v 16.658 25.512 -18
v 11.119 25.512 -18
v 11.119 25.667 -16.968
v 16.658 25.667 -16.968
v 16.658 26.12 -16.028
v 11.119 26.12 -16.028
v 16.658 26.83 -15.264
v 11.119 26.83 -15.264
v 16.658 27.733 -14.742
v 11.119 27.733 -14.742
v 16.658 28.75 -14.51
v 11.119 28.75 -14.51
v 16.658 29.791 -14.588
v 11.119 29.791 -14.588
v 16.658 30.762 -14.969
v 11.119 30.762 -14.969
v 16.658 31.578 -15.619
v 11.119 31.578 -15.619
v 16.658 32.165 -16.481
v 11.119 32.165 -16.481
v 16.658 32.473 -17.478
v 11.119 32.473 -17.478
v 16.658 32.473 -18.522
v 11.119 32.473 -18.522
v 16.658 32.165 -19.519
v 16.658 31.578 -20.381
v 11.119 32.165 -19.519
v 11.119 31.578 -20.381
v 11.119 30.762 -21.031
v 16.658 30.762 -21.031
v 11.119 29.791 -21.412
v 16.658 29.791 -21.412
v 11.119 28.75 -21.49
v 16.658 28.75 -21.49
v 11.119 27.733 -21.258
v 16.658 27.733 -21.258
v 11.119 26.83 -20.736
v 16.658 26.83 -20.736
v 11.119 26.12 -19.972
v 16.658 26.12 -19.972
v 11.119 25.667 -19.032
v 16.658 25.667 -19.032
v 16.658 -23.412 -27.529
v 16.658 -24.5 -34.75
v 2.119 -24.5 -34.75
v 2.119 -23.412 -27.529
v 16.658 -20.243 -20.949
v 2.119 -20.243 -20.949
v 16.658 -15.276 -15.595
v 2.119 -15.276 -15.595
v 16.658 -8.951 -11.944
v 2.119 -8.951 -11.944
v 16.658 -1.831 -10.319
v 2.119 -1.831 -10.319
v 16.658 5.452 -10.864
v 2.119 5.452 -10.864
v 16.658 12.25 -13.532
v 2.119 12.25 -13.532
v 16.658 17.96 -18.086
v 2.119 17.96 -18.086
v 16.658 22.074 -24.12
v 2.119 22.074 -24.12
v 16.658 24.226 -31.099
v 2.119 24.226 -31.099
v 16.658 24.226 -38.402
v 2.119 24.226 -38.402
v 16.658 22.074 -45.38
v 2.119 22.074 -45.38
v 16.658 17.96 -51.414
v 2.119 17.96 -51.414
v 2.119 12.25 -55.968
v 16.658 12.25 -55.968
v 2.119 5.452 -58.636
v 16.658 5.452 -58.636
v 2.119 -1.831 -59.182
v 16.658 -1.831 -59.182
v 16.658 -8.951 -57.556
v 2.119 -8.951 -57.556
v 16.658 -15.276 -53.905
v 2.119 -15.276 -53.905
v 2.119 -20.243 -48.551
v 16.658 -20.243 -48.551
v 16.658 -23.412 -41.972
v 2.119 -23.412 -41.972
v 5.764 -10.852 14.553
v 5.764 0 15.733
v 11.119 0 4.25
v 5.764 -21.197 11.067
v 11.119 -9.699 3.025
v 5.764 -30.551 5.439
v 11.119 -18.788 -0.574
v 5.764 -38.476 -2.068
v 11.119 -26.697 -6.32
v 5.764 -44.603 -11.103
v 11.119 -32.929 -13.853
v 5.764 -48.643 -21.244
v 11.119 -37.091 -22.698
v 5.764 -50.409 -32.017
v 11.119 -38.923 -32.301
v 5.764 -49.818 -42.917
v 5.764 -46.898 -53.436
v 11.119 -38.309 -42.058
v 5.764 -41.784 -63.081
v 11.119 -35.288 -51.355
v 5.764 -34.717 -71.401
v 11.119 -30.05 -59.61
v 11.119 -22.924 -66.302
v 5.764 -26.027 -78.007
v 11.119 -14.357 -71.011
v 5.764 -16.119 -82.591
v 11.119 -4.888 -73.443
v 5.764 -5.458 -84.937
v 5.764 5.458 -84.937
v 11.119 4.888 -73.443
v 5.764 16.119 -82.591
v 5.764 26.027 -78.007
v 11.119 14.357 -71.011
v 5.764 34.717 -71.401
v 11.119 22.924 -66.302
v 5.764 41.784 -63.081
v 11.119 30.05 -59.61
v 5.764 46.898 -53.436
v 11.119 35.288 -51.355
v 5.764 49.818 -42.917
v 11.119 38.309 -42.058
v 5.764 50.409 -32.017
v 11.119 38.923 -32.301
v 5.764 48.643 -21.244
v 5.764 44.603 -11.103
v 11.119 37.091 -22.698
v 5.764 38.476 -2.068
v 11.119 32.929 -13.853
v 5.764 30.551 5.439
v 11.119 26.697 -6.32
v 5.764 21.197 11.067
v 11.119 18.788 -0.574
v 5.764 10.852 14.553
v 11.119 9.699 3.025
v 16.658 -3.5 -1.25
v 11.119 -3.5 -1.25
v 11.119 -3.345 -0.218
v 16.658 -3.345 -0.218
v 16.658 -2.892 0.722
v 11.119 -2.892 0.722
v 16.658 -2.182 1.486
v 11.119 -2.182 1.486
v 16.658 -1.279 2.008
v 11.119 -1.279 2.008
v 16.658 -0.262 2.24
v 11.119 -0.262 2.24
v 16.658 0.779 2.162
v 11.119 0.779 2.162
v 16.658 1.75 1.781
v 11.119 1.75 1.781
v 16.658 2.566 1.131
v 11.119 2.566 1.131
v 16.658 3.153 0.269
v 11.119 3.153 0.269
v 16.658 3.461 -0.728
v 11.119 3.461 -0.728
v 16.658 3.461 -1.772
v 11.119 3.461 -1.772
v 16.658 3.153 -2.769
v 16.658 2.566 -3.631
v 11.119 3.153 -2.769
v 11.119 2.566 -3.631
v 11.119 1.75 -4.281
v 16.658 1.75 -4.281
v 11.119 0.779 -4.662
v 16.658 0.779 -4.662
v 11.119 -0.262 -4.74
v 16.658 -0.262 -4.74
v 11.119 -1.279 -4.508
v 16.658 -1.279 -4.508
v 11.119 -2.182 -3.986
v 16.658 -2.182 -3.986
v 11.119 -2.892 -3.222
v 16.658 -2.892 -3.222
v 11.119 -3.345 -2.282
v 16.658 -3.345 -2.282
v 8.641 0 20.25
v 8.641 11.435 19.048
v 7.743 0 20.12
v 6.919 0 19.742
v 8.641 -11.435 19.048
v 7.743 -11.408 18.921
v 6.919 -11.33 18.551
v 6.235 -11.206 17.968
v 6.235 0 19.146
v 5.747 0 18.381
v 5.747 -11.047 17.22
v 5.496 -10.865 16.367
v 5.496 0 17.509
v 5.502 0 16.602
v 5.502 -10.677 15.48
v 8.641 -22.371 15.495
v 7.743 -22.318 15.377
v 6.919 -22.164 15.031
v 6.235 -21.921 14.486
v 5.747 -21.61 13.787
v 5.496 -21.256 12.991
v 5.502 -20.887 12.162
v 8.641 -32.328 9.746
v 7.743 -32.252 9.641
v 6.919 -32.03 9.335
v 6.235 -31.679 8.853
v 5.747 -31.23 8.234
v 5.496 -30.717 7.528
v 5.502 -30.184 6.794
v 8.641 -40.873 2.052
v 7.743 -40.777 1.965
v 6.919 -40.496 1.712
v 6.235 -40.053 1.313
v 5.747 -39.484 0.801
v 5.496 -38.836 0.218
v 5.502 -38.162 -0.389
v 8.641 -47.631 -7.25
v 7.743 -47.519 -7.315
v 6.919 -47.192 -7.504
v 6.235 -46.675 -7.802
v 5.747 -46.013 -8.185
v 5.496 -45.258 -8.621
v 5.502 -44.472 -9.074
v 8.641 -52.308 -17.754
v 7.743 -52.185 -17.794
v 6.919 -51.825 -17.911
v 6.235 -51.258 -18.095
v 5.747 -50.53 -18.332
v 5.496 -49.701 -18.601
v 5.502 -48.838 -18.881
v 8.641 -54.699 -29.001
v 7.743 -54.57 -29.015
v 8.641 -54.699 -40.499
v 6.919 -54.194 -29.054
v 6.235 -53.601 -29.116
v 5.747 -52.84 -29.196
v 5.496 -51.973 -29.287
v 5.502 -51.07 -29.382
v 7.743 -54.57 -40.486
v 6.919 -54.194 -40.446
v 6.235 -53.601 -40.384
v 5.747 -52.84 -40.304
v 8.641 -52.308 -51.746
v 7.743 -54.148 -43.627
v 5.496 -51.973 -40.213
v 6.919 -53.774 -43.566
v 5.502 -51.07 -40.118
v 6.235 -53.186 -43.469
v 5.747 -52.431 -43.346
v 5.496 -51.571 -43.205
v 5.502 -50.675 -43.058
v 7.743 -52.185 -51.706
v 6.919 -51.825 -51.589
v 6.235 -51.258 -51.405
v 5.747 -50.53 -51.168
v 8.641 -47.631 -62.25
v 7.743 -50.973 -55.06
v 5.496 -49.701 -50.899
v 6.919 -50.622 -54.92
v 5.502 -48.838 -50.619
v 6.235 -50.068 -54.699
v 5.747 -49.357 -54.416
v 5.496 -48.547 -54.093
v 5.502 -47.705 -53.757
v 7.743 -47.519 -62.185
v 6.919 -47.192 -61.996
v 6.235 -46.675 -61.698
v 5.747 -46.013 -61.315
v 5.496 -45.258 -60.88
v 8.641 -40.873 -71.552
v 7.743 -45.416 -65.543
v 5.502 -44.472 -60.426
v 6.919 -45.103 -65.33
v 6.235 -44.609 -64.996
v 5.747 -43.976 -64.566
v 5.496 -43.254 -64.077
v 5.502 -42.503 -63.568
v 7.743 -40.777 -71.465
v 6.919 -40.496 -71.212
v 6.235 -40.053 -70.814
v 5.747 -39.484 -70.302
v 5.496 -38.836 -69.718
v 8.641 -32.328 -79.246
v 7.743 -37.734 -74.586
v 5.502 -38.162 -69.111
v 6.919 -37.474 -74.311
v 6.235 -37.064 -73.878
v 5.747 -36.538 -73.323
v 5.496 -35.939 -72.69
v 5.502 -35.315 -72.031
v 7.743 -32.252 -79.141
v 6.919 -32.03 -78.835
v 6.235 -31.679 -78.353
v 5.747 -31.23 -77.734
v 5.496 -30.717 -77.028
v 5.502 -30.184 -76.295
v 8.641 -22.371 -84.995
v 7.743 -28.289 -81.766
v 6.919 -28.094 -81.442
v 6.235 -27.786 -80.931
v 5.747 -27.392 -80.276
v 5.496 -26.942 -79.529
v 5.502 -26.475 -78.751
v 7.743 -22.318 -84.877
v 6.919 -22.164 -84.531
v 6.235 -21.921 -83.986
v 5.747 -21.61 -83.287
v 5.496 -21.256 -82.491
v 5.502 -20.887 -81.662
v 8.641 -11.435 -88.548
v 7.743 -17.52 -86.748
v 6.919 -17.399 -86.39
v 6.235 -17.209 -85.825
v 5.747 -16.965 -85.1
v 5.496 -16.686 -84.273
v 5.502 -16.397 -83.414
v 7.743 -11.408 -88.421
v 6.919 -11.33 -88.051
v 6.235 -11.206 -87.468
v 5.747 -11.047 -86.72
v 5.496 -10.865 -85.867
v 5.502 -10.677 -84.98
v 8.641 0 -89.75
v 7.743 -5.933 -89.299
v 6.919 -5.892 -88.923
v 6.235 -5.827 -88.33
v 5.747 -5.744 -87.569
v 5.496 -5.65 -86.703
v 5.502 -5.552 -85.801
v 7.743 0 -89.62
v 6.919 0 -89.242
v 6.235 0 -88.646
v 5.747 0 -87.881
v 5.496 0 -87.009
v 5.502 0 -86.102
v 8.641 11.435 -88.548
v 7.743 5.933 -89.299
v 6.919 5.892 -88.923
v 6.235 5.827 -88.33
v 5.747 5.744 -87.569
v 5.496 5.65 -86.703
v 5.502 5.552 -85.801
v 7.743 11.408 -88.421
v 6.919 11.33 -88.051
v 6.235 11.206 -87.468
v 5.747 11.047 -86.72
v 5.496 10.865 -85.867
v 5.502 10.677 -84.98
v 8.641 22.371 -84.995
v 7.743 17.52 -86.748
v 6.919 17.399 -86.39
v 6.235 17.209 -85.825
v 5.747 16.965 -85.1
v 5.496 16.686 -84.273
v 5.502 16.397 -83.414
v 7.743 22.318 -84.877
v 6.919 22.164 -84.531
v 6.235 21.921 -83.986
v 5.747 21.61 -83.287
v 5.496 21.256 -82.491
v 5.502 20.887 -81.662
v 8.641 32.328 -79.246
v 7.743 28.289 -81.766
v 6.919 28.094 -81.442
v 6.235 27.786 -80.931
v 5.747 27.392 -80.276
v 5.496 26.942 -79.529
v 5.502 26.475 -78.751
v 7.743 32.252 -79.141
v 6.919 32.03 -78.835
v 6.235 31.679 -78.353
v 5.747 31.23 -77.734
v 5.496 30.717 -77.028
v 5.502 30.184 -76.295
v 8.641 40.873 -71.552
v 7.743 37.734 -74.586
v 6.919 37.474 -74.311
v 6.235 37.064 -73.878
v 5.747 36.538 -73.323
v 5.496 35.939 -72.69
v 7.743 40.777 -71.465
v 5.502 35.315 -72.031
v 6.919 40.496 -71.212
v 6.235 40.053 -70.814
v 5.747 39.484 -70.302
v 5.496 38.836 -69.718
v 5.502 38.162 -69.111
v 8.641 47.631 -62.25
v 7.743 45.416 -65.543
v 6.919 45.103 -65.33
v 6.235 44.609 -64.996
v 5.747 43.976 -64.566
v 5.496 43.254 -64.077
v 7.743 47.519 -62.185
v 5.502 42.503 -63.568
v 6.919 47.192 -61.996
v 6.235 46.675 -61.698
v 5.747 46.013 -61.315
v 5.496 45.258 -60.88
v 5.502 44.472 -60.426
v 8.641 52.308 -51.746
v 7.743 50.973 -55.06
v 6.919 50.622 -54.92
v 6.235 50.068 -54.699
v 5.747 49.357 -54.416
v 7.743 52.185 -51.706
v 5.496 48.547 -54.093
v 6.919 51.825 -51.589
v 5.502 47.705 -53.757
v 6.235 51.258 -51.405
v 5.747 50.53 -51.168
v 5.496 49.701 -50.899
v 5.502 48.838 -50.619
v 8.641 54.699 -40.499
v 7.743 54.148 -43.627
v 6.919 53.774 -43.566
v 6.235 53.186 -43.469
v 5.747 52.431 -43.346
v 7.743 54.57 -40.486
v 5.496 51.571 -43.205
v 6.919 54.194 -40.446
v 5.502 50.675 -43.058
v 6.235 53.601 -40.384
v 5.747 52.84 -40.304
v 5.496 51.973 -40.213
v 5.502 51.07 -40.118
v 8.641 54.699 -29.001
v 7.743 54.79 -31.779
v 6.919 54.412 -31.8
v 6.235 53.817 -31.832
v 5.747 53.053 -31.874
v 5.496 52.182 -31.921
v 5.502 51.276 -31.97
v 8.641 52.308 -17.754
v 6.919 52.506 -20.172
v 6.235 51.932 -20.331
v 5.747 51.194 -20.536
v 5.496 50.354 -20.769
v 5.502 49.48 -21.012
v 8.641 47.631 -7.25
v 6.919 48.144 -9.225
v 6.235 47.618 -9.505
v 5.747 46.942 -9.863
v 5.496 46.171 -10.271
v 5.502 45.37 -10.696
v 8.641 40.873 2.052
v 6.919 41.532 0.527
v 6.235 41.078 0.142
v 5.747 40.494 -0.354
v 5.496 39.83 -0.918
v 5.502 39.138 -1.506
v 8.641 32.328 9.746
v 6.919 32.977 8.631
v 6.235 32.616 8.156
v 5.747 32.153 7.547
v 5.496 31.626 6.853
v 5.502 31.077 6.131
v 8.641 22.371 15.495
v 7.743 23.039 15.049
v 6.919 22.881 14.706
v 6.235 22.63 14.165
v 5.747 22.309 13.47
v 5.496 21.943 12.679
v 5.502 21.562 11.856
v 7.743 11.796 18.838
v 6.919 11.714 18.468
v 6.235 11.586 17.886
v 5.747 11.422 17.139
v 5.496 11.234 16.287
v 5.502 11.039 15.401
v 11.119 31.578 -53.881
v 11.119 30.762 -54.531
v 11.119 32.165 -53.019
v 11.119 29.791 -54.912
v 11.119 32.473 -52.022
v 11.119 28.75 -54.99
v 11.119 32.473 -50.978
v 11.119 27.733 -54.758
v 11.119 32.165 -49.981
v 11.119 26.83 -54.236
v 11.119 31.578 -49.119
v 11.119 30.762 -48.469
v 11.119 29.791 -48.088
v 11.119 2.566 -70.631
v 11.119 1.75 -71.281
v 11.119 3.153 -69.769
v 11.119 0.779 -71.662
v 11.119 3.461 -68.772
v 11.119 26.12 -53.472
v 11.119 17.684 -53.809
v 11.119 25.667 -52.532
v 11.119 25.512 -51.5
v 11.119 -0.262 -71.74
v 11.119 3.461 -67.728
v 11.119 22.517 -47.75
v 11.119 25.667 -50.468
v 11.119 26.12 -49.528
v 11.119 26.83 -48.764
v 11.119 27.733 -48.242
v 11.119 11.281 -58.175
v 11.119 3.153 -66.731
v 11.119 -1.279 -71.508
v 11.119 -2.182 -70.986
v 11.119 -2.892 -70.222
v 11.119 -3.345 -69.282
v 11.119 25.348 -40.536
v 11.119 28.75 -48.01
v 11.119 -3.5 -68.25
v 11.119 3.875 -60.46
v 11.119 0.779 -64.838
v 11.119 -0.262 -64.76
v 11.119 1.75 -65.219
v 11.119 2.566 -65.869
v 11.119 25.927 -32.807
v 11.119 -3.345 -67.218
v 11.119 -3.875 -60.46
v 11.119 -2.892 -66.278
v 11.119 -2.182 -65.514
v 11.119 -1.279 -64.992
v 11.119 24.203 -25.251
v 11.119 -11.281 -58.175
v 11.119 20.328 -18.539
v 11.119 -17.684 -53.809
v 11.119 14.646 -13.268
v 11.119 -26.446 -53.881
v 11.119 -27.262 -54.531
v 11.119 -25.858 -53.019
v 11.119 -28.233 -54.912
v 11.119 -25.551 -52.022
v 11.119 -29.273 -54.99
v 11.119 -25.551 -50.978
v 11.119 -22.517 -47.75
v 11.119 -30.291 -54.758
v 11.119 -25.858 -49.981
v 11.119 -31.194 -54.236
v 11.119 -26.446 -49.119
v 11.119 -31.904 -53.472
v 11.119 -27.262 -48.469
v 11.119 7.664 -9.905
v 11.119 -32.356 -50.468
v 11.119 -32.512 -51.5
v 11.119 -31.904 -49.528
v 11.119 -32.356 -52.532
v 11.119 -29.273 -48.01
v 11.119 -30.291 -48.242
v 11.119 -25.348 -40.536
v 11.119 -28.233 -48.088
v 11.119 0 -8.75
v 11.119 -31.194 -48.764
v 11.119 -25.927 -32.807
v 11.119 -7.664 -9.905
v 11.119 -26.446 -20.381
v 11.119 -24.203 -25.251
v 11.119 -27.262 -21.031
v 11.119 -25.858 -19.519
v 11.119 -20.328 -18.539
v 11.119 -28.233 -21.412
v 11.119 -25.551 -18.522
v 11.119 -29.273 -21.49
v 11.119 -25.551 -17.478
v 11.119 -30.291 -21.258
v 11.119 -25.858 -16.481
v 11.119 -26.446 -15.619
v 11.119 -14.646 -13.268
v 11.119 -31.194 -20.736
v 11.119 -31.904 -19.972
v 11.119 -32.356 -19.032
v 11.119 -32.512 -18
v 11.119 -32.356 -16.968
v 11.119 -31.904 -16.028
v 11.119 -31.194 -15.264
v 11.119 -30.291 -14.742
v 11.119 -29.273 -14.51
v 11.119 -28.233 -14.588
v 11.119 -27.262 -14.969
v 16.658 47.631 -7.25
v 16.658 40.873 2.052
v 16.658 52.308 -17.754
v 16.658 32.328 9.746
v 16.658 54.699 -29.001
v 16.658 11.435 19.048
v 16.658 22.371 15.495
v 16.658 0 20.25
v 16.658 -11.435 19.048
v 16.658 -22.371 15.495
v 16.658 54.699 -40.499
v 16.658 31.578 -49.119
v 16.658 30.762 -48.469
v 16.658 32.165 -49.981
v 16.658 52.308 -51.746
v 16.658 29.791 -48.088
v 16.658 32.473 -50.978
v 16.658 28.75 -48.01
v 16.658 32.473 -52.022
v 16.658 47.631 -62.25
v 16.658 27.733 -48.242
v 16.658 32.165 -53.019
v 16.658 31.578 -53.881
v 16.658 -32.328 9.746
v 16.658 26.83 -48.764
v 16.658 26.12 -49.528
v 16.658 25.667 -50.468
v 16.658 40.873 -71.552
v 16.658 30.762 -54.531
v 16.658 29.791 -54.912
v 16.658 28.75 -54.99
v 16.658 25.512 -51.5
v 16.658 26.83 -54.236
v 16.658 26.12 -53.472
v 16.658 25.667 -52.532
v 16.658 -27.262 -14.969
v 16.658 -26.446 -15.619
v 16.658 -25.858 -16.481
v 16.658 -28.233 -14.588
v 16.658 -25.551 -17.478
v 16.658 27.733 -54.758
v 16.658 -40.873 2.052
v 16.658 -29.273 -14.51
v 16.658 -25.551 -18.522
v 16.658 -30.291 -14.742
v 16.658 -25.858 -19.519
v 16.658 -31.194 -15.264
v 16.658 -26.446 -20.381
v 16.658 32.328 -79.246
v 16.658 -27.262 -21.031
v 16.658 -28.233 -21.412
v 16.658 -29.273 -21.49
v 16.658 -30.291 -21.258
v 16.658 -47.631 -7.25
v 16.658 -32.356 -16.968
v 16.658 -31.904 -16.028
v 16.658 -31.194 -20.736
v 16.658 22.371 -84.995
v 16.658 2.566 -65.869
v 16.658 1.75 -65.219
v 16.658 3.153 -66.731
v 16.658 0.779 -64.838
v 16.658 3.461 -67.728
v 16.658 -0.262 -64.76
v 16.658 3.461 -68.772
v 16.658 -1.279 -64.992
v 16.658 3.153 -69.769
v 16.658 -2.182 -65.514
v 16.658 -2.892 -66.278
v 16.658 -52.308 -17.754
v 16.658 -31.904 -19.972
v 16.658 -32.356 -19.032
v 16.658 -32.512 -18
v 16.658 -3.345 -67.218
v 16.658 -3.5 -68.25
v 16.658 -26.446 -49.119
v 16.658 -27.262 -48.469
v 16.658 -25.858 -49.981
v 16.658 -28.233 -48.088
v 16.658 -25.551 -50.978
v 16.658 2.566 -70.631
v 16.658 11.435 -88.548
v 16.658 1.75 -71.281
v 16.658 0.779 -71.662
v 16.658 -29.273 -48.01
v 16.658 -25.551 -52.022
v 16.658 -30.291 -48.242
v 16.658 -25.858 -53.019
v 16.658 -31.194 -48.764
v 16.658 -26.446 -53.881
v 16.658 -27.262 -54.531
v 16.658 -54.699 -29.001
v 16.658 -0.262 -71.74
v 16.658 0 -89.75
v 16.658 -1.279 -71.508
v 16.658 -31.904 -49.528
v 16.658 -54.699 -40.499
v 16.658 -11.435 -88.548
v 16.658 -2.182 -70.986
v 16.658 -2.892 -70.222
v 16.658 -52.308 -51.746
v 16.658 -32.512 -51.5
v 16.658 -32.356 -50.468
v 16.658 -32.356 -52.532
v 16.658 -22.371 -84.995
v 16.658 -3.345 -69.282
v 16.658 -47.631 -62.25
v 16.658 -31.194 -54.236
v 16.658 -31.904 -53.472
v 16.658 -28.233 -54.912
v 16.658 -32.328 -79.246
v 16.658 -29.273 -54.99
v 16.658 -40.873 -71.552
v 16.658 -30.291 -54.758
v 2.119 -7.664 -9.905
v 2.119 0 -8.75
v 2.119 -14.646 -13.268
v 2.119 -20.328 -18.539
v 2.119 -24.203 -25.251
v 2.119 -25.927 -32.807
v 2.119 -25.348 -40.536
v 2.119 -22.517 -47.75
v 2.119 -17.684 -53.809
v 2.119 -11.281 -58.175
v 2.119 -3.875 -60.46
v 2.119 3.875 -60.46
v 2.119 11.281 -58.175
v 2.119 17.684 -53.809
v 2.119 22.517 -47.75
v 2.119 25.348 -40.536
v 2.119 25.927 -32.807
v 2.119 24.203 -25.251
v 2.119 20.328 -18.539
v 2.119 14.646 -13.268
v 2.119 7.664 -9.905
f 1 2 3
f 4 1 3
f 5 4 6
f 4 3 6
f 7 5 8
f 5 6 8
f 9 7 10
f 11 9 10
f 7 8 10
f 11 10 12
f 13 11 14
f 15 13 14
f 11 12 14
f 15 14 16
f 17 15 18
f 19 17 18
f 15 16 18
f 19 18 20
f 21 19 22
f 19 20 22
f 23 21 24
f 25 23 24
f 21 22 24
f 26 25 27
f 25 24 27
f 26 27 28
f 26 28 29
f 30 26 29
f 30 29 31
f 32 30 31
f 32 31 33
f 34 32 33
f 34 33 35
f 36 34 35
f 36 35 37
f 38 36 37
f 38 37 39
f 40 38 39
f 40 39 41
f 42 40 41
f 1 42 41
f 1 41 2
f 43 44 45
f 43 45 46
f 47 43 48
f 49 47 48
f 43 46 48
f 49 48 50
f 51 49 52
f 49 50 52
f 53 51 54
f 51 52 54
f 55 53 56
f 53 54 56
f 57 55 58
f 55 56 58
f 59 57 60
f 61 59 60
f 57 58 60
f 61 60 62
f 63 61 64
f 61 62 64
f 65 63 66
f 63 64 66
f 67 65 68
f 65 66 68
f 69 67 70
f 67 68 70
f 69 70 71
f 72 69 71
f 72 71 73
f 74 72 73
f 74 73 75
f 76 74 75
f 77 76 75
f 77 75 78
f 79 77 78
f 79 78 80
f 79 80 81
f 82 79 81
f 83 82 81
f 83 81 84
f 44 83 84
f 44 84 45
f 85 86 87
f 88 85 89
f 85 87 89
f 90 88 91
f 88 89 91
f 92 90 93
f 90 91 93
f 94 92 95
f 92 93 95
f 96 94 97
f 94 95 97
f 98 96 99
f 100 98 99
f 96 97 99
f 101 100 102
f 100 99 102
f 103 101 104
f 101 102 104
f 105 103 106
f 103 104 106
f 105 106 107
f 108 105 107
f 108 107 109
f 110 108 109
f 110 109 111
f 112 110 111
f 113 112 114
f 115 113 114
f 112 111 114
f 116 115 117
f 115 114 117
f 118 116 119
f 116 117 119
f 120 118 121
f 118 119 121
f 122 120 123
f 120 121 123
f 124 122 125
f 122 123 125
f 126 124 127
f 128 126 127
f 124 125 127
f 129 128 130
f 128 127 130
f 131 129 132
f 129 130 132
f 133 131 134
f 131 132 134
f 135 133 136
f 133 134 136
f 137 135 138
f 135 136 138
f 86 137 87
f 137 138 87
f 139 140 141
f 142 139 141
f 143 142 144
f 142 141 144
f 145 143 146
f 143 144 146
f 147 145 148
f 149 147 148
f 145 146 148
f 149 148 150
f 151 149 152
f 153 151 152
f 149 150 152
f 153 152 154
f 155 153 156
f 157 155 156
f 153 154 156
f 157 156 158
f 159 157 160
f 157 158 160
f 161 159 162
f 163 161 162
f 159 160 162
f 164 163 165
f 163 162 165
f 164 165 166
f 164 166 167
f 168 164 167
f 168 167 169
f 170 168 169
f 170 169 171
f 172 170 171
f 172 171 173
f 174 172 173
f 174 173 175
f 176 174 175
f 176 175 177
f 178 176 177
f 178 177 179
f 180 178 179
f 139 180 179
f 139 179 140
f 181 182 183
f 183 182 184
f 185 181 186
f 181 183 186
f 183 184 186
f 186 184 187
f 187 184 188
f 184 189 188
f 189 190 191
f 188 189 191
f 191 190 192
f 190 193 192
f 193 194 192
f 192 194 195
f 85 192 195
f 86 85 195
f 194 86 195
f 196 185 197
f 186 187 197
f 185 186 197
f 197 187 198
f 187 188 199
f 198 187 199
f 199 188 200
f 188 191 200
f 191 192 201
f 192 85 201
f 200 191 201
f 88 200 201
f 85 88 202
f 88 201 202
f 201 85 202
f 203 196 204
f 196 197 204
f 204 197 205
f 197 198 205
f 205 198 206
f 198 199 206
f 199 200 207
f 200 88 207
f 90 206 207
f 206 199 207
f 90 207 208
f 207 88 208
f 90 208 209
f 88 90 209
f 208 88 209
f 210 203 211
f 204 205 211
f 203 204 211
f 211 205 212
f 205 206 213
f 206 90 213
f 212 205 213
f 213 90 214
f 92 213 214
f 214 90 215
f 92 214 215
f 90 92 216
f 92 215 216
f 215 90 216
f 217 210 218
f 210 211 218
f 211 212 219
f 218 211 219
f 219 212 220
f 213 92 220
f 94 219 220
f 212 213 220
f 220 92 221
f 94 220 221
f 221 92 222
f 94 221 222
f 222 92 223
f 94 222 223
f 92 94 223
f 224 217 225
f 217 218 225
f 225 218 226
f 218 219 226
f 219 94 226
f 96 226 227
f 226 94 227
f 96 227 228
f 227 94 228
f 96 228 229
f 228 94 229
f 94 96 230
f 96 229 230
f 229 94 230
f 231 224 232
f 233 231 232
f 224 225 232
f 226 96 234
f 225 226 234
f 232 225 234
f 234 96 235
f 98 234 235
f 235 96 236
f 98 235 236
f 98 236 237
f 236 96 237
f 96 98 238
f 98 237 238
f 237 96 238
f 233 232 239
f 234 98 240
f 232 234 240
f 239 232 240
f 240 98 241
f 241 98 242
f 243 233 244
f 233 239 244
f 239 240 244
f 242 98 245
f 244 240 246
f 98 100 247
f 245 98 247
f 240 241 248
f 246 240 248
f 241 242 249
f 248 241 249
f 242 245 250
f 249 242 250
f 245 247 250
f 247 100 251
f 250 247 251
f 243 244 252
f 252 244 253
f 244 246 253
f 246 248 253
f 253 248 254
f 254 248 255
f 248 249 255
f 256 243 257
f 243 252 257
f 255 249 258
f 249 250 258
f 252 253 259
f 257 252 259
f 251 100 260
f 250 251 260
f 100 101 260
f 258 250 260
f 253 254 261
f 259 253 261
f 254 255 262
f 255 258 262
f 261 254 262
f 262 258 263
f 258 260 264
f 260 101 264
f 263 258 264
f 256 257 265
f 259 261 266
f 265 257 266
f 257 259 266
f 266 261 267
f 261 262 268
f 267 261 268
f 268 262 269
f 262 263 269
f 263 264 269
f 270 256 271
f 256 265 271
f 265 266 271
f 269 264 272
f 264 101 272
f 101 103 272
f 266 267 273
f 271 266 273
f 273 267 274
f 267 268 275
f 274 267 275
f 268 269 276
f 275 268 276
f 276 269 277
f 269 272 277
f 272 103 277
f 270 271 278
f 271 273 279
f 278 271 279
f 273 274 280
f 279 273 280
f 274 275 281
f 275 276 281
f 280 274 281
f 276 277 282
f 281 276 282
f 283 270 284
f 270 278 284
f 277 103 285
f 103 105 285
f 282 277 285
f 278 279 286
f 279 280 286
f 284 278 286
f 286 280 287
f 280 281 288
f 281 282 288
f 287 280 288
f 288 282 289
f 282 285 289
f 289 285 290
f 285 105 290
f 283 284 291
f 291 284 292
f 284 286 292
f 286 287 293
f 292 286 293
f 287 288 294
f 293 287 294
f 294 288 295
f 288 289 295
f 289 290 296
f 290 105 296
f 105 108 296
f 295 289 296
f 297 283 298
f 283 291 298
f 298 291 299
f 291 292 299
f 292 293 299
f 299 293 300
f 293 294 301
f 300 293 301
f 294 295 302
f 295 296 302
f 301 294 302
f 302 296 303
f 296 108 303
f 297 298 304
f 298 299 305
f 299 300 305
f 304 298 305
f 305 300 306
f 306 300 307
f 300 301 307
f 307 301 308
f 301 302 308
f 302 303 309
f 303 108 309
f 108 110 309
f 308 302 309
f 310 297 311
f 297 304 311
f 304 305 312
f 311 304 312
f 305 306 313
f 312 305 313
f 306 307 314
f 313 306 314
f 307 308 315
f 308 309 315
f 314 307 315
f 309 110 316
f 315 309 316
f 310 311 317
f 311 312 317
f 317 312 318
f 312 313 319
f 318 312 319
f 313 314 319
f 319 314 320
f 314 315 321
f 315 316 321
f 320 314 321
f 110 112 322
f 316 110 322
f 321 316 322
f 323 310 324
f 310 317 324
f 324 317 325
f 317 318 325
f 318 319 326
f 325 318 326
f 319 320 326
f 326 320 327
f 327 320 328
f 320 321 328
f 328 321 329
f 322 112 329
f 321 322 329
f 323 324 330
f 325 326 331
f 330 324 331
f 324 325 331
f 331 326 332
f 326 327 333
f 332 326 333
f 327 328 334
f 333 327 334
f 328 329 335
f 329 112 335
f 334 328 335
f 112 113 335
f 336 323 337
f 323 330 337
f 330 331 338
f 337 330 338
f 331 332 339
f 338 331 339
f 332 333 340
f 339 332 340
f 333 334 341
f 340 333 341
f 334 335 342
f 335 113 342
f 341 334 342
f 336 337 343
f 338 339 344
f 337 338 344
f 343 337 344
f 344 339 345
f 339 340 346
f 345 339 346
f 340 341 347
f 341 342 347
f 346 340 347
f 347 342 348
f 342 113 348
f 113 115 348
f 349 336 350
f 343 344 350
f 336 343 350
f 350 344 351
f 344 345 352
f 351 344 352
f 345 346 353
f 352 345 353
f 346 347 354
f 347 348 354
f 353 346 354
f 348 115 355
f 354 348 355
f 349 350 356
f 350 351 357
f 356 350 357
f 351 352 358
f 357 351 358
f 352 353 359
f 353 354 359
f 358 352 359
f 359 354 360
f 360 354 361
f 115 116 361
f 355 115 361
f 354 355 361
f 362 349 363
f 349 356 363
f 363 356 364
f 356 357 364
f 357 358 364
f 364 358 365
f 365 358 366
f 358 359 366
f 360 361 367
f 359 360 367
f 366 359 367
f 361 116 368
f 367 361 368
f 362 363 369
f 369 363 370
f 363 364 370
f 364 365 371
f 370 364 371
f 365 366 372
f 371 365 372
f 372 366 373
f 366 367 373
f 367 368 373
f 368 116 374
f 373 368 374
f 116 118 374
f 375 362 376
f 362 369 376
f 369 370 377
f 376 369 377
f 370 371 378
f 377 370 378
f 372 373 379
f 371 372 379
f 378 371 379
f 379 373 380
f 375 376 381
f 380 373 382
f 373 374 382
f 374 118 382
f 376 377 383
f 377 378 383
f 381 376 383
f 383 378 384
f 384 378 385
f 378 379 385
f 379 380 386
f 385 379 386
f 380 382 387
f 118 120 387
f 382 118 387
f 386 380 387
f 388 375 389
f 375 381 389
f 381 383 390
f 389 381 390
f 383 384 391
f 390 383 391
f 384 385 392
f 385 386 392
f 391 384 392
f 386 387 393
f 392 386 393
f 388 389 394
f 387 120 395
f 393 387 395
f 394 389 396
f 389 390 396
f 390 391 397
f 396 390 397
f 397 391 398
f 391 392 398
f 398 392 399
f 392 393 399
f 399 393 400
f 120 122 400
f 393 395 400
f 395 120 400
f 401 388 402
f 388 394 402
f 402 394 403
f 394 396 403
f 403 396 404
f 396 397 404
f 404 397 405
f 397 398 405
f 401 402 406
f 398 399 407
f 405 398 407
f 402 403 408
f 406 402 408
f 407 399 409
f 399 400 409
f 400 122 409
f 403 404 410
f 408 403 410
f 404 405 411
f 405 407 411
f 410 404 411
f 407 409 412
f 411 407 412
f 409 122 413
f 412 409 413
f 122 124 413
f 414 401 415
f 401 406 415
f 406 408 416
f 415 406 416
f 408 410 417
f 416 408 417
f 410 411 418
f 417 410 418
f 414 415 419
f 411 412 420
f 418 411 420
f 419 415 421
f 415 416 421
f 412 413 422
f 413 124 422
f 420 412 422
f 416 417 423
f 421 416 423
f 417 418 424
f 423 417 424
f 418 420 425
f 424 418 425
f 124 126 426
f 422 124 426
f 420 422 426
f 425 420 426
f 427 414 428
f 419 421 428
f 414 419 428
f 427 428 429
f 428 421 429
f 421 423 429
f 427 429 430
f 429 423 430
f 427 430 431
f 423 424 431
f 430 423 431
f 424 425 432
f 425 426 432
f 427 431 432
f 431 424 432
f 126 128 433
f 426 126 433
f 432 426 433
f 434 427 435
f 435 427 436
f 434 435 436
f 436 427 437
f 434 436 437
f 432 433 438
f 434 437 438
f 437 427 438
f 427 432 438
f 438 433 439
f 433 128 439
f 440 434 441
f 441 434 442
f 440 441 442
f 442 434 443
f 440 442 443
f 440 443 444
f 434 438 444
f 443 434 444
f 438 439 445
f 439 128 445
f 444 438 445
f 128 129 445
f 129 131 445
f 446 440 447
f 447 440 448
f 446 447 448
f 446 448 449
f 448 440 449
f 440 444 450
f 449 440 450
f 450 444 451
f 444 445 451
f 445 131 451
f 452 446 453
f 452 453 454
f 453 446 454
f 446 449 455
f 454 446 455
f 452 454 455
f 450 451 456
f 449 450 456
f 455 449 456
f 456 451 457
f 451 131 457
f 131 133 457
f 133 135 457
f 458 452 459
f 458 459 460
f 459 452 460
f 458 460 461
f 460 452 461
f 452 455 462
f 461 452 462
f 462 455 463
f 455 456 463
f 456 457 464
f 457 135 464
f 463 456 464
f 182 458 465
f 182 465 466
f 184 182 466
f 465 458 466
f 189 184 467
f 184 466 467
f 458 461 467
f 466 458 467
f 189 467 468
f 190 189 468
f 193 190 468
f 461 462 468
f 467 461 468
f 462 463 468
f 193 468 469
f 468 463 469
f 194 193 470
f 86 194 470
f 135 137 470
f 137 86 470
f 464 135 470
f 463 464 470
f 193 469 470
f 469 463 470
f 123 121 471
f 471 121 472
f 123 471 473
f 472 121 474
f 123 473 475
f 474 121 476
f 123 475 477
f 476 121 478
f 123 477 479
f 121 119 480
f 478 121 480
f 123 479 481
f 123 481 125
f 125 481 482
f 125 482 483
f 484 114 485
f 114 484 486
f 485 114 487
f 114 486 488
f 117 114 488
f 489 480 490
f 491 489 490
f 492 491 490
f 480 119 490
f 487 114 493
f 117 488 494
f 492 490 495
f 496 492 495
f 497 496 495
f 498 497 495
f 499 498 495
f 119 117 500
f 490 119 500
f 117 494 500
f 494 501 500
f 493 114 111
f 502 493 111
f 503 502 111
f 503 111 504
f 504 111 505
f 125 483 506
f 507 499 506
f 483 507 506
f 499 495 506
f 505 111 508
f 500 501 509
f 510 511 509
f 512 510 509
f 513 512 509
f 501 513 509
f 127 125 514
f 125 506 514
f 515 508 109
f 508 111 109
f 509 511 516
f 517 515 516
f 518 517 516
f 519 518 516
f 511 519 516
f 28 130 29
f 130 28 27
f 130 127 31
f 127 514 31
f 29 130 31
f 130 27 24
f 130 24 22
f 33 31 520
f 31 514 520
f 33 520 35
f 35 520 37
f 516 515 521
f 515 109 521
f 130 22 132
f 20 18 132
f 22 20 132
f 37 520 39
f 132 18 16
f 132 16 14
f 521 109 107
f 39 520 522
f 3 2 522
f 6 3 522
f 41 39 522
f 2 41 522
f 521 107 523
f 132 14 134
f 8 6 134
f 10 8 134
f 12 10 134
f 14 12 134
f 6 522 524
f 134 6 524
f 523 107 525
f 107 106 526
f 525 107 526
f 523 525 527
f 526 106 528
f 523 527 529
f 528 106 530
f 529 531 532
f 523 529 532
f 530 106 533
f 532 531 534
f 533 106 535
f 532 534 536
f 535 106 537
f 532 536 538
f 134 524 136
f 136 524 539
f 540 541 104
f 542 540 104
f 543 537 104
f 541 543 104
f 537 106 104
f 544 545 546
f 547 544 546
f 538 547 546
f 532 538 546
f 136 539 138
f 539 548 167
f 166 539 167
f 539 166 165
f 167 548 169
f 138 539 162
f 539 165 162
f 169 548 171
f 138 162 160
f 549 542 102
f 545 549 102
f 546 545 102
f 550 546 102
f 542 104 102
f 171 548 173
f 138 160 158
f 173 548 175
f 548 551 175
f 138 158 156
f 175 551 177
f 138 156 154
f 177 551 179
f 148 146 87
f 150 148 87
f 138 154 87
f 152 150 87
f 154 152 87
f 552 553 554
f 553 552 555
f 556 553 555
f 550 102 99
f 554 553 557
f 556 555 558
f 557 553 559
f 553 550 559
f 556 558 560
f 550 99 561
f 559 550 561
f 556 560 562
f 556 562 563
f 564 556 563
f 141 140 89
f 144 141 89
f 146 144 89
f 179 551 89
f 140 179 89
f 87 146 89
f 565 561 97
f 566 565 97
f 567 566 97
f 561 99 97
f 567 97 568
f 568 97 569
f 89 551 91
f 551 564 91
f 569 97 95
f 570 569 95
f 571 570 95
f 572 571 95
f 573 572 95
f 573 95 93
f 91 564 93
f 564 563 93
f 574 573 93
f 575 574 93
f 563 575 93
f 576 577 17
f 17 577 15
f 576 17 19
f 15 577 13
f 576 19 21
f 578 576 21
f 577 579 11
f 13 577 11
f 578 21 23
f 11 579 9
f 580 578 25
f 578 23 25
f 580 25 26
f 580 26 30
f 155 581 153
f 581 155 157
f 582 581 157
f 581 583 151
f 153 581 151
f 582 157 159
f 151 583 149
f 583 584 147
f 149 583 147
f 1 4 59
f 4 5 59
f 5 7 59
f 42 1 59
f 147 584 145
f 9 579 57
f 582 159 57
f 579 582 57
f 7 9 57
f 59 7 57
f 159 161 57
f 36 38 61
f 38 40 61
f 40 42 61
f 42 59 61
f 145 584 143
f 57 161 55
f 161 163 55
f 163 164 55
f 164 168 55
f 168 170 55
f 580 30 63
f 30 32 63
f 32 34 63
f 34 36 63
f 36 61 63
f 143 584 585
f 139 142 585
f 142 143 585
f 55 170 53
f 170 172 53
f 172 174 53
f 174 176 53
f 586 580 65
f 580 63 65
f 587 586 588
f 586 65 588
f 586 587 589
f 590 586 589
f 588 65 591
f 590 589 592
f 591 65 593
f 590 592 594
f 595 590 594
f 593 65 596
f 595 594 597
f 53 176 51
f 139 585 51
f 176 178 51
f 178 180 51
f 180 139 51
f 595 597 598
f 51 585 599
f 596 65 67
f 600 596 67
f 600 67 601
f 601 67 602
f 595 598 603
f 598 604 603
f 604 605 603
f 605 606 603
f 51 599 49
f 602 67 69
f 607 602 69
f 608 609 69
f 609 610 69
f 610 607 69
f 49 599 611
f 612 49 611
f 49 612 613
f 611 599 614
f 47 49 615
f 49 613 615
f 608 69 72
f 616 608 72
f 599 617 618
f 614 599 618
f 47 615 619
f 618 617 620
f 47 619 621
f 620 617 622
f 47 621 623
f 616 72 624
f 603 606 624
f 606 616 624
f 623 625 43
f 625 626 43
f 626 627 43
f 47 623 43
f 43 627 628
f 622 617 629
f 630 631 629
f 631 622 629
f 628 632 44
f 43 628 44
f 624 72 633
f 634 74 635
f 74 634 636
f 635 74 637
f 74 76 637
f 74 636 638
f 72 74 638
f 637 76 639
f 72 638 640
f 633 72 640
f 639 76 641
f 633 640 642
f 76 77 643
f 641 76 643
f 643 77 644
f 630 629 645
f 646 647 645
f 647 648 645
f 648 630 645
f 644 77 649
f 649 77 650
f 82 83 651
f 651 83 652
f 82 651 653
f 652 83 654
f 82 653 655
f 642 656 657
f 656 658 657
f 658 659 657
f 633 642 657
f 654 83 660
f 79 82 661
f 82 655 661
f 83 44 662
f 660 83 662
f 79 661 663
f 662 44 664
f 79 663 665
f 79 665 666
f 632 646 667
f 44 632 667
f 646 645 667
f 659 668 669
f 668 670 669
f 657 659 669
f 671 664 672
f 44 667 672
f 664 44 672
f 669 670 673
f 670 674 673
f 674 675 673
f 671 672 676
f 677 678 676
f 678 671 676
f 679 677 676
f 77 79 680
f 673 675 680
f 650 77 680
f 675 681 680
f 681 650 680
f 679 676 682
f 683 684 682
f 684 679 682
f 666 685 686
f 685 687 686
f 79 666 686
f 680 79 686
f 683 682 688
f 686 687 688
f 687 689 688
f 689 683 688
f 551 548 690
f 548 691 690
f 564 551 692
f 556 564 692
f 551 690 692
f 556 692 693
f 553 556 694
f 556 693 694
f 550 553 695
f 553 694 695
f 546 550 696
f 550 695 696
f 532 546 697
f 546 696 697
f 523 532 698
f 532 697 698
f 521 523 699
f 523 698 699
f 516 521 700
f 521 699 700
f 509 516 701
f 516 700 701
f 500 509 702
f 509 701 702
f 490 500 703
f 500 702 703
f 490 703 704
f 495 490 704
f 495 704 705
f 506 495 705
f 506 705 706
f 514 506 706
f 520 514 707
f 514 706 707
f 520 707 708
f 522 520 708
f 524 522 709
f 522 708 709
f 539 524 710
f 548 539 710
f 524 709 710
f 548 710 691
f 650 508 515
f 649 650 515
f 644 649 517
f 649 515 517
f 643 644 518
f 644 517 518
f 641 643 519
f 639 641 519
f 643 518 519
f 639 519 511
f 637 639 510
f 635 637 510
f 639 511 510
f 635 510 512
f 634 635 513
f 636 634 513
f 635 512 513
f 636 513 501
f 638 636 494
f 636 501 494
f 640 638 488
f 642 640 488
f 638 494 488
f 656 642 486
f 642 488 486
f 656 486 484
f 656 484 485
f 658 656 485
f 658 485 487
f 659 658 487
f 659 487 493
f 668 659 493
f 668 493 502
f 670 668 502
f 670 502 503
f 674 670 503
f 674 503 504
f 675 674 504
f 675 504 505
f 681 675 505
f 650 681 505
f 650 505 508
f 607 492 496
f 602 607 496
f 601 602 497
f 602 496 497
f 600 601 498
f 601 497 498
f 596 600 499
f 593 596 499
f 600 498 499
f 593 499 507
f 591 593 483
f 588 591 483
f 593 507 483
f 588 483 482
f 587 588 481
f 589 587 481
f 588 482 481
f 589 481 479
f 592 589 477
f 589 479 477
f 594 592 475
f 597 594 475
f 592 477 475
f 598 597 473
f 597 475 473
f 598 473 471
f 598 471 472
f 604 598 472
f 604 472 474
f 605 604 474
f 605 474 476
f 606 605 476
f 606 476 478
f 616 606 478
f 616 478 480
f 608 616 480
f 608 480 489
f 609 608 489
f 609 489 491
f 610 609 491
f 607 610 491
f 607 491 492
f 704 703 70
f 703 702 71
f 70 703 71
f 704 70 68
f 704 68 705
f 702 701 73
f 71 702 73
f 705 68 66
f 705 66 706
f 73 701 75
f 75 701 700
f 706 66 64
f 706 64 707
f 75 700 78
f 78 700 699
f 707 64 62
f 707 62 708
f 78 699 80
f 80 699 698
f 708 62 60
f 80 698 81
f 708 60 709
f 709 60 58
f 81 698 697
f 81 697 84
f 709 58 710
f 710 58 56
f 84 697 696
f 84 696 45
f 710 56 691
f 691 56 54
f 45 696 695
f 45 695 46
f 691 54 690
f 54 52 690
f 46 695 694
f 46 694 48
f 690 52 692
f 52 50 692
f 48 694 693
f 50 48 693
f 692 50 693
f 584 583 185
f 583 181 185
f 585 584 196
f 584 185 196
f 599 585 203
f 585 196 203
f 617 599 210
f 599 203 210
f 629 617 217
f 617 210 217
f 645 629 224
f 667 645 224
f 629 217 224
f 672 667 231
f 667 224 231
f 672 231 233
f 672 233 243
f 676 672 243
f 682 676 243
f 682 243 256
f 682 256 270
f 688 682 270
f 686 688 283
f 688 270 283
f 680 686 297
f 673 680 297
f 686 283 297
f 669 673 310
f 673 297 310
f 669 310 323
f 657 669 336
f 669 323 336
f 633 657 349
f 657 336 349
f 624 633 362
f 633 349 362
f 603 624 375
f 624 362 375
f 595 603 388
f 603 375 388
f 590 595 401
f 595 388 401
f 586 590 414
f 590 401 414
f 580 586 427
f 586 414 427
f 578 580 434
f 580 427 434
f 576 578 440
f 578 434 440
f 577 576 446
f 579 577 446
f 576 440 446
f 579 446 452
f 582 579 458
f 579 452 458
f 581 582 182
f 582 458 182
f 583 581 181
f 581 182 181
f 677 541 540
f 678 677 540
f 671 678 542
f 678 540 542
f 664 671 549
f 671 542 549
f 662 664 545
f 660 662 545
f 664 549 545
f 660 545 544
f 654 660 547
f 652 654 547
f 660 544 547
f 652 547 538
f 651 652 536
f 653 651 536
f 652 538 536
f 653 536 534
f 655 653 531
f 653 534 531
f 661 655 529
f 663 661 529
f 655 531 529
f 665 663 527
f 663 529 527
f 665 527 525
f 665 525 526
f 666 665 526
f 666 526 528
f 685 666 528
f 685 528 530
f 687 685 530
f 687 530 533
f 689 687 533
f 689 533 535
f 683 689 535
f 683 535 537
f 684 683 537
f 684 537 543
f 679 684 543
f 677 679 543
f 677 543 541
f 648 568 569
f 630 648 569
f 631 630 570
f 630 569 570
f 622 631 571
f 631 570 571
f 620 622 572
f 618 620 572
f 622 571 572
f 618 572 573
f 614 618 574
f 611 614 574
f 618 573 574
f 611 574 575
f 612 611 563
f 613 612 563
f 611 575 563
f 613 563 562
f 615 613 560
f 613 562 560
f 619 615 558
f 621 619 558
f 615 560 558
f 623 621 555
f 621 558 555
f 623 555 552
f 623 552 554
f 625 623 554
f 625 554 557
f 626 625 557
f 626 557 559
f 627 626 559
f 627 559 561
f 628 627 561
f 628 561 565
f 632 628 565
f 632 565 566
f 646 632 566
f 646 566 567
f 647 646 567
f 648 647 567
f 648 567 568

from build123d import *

# Parameters (mm, degrees)
F2_R     = 24.5
F3_DEPTH = 14.540077
F4_R     = 3.5
F5_DEPTH = 5.540077


with BuildPart() as f1:
    # F0 (on Front) → F1 (revolve)
    with BuildSketch(Plane.XZ):
        with BuildLine():
            Line((16.65759, 20.249971), (8.641342, 20.249971))
            ThreePointArc((8.641342, 20.249971), (5.963574, 18.780897), (5.763815, 15.733158))
            Line((5.763815, 15.733158), (11.118513, 4.249971))
            Line((11.118513, 4.249971), (11.118513, -8.750029))
            Line((11.118513, -8.750029), (2.118513, -8.750029))
            Line((2.118513, -8.750029), (2.118513, -34.750036))
            Line((2.118513, -34.750036), (16.65759, -34.750036))
            Line((16.65759, -34.750036), (16.65759, 4.249971))
            Line((16.65759, 4.249971), (16.65759, 20.249971))
        make_face()
    revolve(axis=Axis((9.388052, 0, -34.750036), (1, 0, 0)))

    # F2 (on face) → F3 (cut, through all)
    with BuildSketch(Plane(origin=(2.118513, 0, 0), x_dir=(0, -1, 0), z_dir=(-1, 0, 0))):
        with Locations((0, -34.750036)):
            Circle(F2_R)
    extrude(amount=-F3_DEPTH, mode=Mode.SUBTRACT)

    # F4 (on face) → F5 (cut, through all)
    with BuildSketch(Plane(origin=(11.118513, 0, 0), x_dir=(0, -1, 0), z_dir=(-1, 0, 0))):
        with Locations((0, -1.250036)):
            Circle(F4_R)
        with Locations((-29.011851, -18.000036)):
            Circle(F4_R)
        with Locations((-29.011851, -51.500036)):
            Circle(F4_R)
        with Locations((0, -68.250036)):
            Circle(F4_R)
        with Locations((29.011851, -51.500036)):
            Circle(F4_R)
        with Locations((29.011851, -18.000036)):
            Circle(F4_R)
    extrude(amount=-F5_DEPTH, mode=Mode.SUBTRACT)


solid = f1.part
